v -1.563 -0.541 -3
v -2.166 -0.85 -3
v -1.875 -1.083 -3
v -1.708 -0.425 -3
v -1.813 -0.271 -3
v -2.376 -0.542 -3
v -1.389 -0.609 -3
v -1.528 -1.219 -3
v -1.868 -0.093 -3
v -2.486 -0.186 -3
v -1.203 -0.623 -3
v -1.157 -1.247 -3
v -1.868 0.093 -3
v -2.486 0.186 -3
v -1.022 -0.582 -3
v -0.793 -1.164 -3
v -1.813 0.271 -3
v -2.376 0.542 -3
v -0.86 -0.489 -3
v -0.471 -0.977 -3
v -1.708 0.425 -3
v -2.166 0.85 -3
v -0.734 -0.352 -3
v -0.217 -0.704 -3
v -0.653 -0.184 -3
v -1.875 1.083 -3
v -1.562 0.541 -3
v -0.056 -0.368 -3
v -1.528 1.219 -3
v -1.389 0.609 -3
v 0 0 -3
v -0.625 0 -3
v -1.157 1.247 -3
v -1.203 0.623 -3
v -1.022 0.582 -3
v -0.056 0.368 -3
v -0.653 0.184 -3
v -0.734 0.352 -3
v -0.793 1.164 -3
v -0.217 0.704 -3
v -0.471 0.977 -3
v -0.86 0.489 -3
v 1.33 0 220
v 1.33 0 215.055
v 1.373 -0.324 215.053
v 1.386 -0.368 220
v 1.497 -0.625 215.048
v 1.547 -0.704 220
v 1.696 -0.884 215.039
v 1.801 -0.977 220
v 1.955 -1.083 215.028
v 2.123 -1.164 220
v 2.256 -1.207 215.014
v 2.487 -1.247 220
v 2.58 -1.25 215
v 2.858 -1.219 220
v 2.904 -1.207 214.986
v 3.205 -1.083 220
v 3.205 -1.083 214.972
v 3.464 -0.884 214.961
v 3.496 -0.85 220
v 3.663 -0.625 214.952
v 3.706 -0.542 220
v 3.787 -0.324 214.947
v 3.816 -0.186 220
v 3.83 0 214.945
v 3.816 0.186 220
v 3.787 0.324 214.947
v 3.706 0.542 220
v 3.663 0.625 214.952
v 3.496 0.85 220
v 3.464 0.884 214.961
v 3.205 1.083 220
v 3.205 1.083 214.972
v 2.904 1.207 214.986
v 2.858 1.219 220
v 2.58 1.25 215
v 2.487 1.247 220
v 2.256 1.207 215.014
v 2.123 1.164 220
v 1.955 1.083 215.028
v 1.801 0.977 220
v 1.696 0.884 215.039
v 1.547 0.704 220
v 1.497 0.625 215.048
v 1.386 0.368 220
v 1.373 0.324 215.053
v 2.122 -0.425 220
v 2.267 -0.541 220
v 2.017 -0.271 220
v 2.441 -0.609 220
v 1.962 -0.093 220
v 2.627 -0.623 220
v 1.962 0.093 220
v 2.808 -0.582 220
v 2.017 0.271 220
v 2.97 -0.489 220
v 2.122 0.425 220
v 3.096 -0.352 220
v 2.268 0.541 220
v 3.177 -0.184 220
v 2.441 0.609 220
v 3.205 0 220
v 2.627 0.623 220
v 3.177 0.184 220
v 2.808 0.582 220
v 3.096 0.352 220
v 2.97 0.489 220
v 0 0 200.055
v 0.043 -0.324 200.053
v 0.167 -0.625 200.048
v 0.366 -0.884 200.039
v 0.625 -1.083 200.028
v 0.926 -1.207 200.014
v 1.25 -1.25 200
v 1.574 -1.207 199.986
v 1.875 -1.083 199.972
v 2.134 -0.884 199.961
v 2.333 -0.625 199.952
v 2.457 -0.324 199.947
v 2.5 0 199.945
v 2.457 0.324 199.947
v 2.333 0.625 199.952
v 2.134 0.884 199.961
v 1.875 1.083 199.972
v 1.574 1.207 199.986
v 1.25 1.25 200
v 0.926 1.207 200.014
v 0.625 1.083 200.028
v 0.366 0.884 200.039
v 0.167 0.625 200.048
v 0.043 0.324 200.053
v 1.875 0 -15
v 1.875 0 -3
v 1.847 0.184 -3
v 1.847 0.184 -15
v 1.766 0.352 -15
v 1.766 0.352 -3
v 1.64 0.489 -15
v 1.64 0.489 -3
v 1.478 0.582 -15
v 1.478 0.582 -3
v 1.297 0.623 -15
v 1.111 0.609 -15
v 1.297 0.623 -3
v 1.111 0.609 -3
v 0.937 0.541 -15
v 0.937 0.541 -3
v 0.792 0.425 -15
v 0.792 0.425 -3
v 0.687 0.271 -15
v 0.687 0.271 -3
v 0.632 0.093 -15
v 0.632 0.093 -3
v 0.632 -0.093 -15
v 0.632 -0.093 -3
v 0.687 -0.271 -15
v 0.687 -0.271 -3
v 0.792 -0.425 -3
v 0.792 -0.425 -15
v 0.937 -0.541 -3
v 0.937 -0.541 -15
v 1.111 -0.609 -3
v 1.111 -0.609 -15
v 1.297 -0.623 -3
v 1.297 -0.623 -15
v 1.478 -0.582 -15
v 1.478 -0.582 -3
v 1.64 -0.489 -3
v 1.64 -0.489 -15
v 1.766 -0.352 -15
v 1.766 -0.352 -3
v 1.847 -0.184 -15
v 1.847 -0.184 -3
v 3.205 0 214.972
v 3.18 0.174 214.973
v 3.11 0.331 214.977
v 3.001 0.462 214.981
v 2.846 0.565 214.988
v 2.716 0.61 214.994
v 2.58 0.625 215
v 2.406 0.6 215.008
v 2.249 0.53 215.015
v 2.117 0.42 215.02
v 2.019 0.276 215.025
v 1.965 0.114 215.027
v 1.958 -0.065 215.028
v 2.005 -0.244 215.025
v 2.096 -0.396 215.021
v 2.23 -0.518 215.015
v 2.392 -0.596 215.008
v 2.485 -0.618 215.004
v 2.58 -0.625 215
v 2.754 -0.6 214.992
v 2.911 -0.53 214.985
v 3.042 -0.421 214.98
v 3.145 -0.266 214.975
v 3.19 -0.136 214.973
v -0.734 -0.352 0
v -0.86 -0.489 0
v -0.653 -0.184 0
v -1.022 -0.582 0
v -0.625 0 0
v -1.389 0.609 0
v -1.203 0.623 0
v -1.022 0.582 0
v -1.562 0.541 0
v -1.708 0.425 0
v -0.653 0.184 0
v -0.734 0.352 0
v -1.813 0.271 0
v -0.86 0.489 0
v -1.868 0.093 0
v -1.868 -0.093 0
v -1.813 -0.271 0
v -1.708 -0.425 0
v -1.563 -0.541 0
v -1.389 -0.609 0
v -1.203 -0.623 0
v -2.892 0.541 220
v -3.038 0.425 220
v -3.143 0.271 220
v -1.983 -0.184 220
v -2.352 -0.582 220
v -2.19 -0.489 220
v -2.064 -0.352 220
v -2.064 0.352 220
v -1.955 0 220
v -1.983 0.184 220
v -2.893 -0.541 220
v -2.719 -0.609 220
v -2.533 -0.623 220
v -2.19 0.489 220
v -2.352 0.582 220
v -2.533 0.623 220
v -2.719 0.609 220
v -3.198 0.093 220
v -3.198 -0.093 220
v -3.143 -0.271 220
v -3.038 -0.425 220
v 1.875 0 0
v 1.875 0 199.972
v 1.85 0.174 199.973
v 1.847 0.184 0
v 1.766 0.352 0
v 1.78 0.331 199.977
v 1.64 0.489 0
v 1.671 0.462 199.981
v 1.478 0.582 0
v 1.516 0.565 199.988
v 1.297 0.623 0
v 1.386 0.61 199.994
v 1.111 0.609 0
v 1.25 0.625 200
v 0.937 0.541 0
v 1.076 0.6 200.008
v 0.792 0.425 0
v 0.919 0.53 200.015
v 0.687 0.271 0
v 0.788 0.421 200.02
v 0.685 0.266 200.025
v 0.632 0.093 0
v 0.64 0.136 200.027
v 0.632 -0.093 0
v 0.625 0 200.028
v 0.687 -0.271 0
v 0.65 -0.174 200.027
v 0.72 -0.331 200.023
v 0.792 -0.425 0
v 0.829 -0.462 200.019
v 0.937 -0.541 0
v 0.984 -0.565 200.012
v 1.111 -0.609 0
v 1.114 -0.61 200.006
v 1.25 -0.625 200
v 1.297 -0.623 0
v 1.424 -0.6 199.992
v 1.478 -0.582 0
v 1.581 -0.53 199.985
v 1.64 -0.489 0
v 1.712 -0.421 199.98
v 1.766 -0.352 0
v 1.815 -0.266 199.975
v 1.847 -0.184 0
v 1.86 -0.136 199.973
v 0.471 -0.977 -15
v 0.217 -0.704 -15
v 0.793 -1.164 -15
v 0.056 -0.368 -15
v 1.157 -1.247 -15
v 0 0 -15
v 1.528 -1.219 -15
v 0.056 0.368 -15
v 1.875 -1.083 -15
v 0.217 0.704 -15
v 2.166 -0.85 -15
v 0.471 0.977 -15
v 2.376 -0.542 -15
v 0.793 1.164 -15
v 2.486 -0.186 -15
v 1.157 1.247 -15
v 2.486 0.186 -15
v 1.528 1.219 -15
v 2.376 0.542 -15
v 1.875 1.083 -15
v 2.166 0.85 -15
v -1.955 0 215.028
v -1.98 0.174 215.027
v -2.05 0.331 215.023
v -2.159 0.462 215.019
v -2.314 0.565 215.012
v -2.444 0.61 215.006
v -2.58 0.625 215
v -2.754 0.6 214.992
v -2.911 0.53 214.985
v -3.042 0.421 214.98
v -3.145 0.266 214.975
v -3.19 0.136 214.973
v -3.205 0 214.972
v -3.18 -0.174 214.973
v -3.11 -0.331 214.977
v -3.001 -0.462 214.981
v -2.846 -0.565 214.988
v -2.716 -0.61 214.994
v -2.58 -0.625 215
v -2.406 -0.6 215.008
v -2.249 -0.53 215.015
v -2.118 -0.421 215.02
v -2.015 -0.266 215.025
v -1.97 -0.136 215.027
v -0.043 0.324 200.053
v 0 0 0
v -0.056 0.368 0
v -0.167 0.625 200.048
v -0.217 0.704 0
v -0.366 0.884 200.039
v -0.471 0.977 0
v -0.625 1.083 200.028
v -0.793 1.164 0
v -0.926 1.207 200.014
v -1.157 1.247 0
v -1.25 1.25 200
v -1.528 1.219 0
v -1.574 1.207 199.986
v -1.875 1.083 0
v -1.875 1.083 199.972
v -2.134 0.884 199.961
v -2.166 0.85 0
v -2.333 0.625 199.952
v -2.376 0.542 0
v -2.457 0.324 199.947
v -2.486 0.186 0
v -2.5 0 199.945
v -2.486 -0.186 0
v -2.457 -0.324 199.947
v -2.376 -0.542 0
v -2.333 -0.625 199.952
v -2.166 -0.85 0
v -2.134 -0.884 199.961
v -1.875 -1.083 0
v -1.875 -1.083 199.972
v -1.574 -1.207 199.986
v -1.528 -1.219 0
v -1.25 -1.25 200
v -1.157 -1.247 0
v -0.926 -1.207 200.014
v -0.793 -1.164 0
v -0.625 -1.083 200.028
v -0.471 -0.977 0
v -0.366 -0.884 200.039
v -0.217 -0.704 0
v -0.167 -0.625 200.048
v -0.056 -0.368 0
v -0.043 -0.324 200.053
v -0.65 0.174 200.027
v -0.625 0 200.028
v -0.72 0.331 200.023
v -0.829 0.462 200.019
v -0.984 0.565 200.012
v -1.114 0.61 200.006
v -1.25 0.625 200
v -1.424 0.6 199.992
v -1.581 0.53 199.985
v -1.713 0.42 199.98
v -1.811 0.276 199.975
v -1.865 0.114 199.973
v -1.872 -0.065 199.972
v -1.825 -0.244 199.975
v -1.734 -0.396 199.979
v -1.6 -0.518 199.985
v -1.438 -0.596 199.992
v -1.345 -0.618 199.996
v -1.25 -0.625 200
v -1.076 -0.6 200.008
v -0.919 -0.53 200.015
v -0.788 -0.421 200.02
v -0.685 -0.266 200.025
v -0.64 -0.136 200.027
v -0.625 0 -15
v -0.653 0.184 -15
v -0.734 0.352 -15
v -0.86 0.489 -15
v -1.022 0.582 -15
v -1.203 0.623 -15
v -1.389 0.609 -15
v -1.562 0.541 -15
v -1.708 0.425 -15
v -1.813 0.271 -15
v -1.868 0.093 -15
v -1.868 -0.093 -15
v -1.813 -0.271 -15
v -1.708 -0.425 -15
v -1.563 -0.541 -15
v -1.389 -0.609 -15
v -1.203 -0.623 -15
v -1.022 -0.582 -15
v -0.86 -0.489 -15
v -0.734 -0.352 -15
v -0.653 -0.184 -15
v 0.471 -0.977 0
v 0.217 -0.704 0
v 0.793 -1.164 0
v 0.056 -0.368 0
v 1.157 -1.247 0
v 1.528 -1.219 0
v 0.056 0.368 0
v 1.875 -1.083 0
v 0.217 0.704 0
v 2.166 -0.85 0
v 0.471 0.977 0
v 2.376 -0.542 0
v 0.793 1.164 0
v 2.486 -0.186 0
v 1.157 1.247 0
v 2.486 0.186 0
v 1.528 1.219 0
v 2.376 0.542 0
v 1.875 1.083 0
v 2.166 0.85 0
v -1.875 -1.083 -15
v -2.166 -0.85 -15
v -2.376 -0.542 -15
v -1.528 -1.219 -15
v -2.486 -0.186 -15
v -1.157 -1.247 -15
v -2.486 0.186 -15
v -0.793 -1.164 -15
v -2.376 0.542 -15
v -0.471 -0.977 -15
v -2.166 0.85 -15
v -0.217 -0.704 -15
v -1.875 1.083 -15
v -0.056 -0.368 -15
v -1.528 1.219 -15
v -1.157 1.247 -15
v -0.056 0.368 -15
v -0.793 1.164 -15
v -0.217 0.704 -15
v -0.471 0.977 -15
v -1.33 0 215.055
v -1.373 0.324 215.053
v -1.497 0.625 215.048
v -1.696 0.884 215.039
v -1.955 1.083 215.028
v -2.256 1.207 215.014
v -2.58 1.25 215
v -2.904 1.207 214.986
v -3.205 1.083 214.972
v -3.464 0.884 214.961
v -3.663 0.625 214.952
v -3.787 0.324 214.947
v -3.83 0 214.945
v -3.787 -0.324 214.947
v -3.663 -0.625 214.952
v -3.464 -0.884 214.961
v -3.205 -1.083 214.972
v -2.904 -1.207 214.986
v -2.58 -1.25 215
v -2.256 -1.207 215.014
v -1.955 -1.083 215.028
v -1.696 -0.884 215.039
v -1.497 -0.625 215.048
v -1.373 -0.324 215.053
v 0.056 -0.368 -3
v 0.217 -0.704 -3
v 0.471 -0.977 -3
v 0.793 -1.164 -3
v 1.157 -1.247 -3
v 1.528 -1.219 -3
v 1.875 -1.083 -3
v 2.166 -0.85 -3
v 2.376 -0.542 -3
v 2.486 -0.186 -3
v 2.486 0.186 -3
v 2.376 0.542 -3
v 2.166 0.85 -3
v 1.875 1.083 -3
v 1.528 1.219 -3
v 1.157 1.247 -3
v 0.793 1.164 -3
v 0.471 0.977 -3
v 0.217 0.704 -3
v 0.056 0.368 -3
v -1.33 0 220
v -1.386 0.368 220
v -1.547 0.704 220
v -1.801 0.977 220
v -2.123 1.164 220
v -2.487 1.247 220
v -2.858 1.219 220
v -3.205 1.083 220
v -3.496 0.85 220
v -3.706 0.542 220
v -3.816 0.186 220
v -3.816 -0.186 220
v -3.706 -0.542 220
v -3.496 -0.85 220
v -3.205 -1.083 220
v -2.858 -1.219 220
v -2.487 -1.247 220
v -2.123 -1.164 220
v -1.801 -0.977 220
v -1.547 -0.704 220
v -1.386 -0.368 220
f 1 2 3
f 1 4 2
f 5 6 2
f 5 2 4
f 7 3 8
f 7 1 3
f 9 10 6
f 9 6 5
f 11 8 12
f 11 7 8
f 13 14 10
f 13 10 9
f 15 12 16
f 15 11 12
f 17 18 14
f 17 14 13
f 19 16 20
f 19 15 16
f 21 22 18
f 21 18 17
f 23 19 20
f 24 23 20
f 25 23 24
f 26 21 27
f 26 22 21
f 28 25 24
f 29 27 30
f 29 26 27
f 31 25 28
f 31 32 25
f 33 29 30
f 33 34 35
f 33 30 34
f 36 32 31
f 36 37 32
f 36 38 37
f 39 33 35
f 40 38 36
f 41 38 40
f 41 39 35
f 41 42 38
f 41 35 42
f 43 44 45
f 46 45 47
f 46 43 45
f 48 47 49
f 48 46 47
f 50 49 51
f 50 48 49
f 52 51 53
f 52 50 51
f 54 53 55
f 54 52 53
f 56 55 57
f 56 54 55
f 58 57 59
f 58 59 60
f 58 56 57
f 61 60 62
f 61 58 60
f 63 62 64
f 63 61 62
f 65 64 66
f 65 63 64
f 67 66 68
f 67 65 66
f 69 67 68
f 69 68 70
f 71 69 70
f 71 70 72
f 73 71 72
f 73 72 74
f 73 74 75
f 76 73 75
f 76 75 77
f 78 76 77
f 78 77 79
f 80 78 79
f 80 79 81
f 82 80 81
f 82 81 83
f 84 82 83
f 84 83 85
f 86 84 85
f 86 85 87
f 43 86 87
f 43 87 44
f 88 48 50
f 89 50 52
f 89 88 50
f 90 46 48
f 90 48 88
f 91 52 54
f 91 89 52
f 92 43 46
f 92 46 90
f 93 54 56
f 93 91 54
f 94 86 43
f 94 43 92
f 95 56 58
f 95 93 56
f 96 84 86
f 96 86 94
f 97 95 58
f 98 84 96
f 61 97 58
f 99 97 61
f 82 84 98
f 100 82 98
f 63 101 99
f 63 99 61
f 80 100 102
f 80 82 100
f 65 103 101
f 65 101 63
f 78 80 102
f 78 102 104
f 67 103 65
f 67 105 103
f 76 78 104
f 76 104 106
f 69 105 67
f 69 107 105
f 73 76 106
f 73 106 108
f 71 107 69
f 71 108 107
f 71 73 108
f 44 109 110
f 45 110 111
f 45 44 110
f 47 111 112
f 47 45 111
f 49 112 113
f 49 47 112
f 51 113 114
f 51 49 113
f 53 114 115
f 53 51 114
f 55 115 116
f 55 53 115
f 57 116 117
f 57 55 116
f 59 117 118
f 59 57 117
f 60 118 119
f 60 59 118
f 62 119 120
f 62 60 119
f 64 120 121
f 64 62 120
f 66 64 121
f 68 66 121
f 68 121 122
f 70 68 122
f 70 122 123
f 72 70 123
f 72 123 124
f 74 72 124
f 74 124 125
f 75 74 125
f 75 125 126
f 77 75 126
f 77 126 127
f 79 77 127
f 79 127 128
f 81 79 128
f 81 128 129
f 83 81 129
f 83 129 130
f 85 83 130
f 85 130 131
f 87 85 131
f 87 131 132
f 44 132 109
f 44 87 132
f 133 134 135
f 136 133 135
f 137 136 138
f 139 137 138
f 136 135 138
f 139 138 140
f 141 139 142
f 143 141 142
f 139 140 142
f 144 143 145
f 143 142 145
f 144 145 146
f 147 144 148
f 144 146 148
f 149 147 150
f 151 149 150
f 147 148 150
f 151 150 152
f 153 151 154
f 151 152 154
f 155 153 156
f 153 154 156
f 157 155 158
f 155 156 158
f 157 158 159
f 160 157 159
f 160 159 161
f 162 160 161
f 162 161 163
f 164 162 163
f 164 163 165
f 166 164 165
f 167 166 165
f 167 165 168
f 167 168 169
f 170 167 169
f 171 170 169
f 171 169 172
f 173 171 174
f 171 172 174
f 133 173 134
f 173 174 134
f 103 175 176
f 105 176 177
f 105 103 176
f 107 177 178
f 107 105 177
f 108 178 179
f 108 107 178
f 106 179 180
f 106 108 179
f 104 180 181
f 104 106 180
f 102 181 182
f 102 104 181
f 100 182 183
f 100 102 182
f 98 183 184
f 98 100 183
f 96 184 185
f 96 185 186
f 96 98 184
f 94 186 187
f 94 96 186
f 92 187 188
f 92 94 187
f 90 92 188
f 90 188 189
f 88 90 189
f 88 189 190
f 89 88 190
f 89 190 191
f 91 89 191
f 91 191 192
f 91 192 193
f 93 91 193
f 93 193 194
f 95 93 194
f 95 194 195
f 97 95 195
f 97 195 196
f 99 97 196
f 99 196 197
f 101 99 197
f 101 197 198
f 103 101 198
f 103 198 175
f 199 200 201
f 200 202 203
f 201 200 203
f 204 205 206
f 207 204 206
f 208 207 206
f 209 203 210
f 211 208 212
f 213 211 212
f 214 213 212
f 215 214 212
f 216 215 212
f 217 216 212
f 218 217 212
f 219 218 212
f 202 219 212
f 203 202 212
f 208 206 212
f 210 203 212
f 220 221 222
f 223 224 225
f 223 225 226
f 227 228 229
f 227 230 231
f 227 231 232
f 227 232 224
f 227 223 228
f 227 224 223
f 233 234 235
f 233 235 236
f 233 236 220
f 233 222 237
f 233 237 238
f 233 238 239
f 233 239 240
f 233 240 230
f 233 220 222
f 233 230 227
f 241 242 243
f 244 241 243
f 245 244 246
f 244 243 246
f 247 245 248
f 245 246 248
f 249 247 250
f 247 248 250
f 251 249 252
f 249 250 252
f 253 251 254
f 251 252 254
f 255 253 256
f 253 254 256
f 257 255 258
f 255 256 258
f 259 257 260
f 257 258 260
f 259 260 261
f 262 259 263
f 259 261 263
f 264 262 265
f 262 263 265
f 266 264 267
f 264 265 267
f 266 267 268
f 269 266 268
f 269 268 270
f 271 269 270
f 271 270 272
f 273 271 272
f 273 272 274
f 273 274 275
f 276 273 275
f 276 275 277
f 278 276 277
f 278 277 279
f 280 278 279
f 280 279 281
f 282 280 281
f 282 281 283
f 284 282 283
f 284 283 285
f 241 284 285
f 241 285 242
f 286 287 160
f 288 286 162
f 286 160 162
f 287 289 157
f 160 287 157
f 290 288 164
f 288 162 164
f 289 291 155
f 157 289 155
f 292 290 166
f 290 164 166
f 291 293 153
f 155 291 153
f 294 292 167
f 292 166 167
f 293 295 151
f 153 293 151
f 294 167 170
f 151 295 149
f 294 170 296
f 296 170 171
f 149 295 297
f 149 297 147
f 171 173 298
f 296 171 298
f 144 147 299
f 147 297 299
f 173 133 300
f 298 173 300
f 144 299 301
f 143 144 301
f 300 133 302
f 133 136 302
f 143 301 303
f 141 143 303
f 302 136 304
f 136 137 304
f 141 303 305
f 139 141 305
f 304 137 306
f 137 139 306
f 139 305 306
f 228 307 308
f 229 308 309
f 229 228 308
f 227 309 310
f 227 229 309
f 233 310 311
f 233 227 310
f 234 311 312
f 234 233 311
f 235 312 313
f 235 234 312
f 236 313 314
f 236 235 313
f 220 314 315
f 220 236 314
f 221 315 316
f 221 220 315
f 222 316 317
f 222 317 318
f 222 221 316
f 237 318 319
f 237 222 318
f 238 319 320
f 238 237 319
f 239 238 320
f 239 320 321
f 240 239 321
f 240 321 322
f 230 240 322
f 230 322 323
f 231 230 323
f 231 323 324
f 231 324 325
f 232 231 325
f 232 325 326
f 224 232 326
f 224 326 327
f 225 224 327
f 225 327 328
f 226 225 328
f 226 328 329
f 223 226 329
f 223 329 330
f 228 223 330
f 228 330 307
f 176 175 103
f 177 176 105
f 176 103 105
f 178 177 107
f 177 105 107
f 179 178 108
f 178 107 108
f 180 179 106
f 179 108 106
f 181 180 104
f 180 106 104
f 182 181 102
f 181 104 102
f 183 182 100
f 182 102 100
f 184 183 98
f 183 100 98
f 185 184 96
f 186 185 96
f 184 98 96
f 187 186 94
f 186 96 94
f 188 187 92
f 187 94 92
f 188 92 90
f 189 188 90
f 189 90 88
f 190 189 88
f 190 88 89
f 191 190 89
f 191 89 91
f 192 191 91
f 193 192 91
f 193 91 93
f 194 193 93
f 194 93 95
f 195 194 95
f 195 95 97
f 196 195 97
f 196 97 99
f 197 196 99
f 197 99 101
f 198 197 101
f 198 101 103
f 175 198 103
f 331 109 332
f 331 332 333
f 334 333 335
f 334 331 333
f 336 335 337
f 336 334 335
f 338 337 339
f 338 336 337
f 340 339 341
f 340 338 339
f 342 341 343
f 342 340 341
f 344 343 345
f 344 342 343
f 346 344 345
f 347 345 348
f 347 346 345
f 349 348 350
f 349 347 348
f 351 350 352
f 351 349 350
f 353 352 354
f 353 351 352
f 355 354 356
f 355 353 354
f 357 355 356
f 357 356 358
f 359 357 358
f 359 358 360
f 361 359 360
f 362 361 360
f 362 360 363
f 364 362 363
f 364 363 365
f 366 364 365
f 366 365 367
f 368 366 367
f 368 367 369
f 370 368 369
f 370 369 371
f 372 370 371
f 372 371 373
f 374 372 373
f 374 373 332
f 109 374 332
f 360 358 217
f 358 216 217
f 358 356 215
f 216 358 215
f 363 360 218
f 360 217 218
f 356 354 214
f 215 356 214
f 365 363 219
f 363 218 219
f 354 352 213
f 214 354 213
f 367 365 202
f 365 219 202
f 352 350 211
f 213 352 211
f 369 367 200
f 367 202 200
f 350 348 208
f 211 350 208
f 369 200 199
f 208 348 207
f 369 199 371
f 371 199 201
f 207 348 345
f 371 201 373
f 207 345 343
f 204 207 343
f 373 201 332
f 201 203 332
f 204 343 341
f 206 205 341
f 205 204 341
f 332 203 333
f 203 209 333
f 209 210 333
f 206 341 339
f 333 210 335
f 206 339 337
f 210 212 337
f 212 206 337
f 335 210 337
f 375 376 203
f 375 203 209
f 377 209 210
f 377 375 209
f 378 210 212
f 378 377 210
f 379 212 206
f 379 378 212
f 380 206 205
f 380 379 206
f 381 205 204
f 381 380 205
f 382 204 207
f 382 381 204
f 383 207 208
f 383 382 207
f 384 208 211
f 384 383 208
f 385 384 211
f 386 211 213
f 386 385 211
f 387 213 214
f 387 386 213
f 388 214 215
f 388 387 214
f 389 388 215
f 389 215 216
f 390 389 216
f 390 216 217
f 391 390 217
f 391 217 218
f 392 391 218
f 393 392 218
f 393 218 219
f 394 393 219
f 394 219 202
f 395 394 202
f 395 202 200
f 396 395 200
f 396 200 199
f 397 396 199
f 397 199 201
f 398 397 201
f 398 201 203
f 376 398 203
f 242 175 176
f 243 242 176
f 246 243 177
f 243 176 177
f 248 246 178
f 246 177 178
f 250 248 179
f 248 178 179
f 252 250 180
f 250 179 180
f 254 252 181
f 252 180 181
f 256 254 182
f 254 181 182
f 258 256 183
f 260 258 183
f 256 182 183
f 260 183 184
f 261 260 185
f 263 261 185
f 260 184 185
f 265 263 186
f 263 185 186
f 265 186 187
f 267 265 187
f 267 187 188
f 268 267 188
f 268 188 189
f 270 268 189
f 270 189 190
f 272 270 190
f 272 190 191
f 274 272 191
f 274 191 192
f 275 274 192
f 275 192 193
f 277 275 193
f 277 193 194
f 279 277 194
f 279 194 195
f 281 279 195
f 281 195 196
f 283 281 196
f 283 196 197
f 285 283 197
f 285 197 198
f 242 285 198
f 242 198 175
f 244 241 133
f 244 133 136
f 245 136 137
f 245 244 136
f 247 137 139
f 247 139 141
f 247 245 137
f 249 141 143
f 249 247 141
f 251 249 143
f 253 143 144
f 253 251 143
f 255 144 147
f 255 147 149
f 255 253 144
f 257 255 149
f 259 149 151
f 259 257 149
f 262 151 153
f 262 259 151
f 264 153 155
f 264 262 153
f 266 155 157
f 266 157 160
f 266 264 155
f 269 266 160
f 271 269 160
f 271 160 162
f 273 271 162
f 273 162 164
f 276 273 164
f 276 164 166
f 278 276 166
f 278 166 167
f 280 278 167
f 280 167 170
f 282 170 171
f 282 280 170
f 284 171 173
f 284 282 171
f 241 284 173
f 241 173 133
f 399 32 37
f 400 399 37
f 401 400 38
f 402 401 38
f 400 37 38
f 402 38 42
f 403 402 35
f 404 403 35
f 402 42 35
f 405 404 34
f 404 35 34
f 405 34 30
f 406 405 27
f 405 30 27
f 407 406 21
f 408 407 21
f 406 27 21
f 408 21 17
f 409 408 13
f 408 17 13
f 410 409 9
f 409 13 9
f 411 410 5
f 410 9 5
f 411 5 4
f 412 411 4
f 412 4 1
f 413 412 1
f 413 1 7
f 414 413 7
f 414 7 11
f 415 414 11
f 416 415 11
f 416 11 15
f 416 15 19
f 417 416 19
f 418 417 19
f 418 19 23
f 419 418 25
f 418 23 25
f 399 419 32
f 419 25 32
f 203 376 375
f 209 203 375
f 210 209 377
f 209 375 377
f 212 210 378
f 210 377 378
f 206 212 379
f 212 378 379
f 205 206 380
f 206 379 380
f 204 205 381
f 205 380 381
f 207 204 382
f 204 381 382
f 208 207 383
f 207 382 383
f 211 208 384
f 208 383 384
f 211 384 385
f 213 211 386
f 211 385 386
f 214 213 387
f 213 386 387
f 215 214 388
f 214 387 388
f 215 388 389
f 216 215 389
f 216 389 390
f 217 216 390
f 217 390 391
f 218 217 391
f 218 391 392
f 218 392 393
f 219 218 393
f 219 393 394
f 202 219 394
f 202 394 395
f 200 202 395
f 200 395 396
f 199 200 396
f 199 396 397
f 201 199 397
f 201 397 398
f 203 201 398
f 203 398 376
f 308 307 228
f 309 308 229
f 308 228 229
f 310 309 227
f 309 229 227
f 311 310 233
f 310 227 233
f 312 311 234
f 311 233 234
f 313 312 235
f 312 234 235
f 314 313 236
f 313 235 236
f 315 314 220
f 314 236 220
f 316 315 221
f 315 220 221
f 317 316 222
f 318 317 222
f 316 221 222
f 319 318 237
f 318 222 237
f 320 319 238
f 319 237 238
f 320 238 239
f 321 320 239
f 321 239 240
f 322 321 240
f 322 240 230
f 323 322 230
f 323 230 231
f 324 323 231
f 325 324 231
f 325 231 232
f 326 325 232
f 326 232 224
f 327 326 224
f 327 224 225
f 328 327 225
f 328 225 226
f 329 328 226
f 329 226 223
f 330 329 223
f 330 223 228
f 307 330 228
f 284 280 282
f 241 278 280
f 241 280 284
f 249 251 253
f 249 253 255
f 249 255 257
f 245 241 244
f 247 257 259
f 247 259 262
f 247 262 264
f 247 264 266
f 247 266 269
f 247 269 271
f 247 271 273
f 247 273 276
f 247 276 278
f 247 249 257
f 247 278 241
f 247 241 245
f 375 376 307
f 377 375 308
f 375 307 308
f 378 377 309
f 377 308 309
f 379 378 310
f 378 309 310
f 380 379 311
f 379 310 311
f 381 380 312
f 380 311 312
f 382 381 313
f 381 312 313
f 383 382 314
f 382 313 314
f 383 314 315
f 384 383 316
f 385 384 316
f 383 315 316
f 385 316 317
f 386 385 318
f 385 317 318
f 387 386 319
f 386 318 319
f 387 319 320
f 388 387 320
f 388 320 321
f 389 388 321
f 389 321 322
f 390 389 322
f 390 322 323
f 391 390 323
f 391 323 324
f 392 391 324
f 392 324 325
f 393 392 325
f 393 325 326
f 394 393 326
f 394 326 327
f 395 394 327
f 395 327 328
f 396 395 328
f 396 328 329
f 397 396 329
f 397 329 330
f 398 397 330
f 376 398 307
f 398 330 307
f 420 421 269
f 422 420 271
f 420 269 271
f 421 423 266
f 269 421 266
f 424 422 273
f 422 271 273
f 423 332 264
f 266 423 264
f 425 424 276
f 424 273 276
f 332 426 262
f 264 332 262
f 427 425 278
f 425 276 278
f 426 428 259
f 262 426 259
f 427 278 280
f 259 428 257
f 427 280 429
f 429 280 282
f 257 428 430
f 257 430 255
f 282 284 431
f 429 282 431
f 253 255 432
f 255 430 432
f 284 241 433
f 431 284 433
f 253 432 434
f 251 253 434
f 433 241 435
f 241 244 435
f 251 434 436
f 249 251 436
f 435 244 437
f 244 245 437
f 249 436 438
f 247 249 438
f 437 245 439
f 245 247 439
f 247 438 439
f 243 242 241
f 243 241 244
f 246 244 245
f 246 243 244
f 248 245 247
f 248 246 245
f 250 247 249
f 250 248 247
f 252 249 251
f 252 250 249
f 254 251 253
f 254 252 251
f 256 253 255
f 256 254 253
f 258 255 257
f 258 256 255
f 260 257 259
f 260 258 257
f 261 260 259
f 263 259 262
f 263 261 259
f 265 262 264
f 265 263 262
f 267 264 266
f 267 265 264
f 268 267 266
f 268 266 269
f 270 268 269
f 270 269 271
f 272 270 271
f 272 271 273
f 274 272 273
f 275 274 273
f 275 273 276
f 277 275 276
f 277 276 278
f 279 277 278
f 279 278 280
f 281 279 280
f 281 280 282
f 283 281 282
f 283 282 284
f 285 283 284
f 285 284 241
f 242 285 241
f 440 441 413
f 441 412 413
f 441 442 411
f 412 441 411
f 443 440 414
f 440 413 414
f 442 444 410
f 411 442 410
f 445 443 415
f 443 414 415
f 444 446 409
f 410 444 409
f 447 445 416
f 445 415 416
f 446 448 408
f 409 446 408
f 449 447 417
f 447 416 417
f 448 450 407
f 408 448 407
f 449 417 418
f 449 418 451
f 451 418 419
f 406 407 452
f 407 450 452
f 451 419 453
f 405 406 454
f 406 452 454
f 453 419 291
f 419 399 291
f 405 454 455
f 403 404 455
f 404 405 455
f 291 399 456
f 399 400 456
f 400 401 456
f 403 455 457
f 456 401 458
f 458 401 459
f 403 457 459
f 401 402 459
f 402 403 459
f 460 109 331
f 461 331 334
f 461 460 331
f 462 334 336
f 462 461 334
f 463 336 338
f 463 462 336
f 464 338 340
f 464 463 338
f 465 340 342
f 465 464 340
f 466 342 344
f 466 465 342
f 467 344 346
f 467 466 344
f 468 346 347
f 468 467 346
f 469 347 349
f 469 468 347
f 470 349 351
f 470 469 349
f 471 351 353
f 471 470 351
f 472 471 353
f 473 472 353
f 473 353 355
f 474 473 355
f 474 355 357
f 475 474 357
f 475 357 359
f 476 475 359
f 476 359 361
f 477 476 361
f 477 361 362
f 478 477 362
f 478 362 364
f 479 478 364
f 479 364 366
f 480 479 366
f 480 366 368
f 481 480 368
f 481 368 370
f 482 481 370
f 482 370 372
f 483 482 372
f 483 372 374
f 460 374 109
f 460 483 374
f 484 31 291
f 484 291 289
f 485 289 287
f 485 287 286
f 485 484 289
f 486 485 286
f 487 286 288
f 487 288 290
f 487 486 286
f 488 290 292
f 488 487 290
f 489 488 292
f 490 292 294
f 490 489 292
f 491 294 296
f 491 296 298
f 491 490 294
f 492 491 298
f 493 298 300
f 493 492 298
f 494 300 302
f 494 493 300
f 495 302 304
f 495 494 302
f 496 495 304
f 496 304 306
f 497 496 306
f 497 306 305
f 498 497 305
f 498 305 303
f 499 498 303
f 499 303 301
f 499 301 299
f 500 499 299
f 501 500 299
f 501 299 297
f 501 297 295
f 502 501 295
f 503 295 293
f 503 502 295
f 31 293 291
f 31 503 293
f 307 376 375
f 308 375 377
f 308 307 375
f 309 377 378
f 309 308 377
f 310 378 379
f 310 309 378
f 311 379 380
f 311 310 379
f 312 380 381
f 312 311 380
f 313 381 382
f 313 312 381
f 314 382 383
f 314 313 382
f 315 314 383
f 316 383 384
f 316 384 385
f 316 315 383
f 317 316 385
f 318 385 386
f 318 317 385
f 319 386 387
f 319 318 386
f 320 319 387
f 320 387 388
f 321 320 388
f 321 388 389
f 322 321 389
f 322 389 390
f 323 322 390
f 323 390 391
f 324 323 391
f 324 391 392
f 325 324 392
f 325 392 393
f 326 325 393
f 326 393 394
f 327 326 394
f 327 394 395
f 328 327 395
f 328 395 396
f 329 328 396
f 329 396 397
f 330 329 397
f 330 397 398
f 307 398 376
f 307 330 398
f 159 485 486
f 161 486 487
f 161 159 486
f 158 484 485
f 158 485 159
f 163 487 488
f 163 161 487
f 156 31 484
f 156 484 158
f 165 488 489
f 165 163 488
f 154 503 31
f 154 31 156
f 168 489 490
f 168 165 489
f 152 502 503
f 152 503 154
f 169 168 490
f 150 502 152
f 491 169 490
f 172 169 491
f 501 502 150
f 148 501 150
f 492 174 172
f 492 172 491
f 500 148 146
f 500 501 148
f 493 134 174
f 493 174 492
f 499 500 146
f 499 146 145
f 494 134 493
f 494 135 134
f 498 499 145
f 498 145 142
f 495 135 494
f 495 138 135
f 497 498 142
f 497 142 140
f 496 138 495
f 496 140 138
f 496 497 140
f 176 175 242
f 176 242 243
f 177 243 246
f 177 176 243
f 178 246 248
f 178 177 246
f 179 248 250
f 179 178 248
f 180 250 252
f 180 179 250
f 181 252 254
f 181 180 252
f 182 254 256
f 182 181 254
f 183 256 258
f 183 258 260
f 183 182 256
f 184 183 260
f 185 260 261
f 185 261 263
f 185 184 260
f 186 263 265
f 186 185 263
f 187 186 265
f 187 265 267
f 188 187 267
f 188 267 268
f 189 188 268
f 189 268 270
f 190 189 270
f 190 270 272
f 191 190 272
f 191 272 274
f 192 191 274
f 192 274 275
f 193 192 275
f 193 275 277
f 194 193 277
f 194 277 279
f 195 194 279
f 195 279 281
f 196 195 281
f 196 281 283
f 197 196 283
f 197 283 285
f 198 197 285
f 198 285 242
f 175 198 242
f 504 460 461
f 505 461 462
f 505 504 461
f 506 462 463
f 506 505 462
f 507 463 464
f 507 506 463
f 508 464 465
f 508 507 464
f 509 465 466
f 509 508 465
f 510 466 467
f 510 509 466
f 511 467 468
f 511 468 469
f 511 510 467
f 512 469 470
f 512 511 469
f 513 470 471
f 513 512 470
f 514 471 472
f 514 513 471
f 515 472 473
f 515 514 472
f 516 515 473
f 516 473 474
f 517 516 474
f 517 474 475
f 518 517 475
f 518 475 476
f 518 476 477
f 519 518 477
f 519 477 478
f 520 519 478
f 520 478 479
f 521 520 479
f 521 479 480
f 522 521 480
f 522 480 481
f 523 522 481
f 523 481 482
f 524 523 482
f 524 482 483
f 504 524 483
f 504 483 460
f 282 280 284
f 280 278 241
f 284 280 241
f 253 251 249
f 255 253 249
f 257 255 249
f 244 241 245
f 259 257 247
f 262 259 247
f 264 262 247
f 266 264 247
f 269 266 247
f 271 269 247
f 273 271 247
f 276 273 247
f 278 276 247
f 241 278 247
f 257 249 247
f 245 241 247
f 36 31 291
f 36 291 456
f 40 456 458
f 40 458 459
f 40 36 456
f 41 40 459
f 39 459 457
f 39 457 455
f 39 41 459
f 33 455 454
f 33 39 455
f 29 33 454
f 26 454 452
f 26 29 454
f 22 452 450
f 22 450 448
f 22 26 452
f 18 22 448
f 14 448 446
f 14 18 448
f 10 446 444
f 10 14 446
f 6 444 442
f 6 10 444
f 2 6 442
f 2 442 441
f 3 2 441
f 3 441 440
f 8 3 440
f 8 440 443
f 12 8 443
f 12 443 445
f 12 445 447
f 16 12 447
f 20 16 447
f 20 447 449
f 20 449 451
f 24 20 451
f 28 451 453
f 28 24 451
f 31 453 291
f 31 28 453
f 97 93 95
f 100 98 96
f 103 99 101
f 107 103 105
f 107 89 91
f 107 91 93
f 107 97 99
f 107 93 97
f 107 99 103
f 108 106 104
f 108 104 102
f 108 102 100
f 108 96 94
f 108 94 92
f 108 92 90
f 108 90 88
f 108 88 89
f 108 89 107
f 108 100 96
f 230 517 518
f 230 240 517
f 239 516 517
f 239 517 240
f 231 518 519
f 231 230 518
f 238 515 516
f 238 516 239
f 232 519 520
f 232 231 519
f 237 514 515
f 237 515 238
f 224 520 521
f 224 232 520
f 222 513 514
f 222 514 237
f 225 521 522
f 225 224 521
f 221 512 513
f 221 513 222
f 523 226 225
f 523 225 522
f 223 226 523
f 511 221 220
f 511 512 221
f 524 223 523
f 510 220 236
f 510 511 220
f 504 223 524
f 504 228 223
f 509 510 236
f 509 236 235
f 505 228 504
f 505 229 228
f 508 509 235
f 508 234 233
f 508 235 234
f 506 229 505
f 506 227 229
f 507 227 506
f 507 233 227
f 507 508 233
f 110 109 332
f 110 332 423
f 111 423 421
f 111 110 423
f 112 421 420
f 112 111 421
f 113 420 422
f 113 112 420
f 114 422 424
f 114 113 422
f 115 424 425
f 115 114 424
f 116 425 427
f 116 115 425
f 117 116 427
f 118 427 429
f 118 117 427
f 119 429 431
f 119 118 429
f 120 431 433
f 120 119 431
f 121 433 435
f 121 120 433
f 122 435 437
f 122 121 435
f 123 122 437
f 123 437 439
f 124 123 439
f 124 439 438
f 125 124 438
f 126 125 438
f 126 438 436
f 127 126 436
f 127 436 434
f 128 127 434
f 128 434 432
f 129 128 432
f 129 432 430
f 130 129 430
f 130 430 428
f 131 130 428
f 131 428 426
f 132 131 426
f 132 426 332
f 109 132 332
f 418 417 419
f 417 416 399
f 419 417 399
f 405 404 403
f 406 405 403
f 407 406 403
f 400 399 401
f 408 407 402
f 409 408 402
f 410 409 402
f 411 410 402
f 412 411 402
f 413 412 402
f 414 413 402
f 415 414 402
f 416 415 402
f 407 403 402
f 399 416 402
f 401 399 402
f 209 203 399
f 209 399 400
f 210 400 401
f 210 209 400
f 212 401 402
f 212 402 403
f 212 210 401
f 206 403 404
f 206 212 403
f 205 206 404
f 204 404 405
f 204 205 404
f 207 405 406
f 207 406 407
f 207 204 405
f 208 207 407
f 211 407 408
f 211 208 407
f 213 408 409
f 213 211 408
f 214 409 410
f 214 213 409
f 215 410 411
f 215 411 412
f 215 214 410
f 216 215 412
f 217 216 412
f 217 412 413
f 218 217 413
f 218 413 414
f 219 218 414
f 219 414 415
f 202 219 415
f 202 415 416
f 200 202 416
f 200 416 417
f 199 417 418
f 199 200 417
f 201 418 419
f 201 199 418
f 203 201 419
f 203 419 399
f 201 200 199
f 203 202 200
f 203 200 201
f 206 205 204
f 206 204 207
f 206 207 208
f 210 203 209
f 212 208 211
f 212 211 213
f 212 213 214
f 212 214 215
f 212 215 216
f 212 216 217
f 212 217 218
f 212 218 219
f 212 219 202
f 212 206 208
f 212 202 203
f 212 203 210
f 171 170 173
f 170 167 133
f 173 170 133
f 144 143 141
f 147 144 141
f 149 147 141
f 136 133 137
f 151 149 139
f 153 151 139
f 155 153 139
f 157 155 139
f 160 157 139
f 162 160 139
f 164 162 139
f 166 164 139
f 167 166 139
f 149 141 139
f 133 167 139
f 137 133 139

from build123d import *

# Parameters (mm, degrees)
F1_R     = 0.625
F1_R_2   = 1.25
F6_DEPTH = 15
F7_START = -3
F7_DEPTH = 12


with BuildPart() as f2:
    # F2: sweep along a path in F0
    with BuildLine(Plane.XZ) as f2_path:
        Line((1.25, 0), (1.25, 200))
        Line((1.25, 200), (2.58, 215))
        Line((2.58, 215), (2.58, 220))
    # F1 (on Top) → F2 (sweep)
    with BuildSketch(Plane.XY):
        with Locations((1.25, 0)):
            Circle(F1_R)
    sweep(path=f2_path.line, transition=Transition.RIGHT)


with BuildPart() as f3:
    # F3: sweep along a path in F0
    with BuildLine(Plane.XZ) as f3_path:
        Line((-1.25, 0), (-1.25, 200))
        Line((-1.25, 200), (-2.58, 215))
        Line((-2.58, 215), (-2.58, 220))
    # F1 (on Top) → F3 (sweep)
    with BuildSketch(Plane.XY):
        with Locations((-1.25, 0)):
            Circle(F1_R)
    sweep(path=f3_path.line, transition=Transition.RIGHT)


with BuildPart() as f4:
    # F4: sweep along a path in F0
    with BuildLine(Plane.XZ) as f4_path:
        Line((1.25, 0), (1.25, 200))
        Line((1.25, 200), (2.58, 215))
        Line((2.58, 215), (2.58, 220))
    # F1 (on Top) → F4 (sweep)
    with BuildSketch(Plane.XY):
        with BuildLine():
            ThreePointArc((2.5, 0), (1.25, 1.25), (0, 0))
            ThreePointArc((0, 0), (1.25, -1.25), (2.5, 0))
        make_face()
        with Locations((1.25, 0)):
            Circle(F1_R, mode=Mode.SUBTRACT)
    sweep(path=f4_path.line, transition=Transition.RIGHT)


with BuildPart() as f5:
    # F5: sweep along a path in F0
    with BuildLine(Plane.XZ) as f5_path:
        Line((-1.25, 0), (-1.25, 200))
        Line((-1.25, 200), (-2.58, 215))
        Line((-2.58, 215), (-2.58, 220))
    # F1 (on Top) → F5 (sweep)
    with BuildSketch(Plane.XY):
        with Locations((-1.25, 0)):
            Circle(F1_R_2)
        with Locations((-1.25, 0)):
            Circle(F1_R, mode=Mode.SUBTRACT)
    sweep(path=f5_path.line, transition=Transition.RIGHT)


with BuildPart() as f6:
    # F1 (on Top) → F6 (new body)
    with BuildSketch(Plane.XY):
        with Locations((-1.25, 0)):
            Circle(F1_R)
    extrude(amount=-F6_DEPTH)


with BuildPart() as f6b:
    # F1 (on Top) → F6, piece 2 (new body)
    with BuildSketch(Plane.XY):
        with Locations((1.25, 0)):
            Circle(F1_R)
    extrude(amount=-F6_DEPTH)


with BuildPart() as f7:
    # F1 (on Top) → F7 (new body)
    with BuildSketch(Plane.XY.offset(F7_START)):
        with Locations((-1.25, 0)):
            Circle(F1_R_2)
        with Locations((-1.25, 0)):
            Circle(F1_R, mode=Mode.SUBTRACT)
    extrude(amount=-F7_DEPTH)


with BuildPart() as f7b:
    # F1 (on Top) → F7, piece 2 (new body)
    with BuildSketch(Plane.XY.offset(F7_START)):
        with BuildLine():
            ThreePointArc((2.5, 0), (1.25, 1.25), (0, 0))
            ThreePointArc((0, 0), (1.25, -1.25), (2.5, 0))
        make_face()
        with Locations((1.25, 0)):
            Circle(F1_R, mode=Mode.SUBTRACT)
    extrude(amount=-F7_DEPTH)


solid = Compound([f2.part, f3.part, f4.part, f5.part, f6.part, f6b.part, f7.part, f7b.part])
